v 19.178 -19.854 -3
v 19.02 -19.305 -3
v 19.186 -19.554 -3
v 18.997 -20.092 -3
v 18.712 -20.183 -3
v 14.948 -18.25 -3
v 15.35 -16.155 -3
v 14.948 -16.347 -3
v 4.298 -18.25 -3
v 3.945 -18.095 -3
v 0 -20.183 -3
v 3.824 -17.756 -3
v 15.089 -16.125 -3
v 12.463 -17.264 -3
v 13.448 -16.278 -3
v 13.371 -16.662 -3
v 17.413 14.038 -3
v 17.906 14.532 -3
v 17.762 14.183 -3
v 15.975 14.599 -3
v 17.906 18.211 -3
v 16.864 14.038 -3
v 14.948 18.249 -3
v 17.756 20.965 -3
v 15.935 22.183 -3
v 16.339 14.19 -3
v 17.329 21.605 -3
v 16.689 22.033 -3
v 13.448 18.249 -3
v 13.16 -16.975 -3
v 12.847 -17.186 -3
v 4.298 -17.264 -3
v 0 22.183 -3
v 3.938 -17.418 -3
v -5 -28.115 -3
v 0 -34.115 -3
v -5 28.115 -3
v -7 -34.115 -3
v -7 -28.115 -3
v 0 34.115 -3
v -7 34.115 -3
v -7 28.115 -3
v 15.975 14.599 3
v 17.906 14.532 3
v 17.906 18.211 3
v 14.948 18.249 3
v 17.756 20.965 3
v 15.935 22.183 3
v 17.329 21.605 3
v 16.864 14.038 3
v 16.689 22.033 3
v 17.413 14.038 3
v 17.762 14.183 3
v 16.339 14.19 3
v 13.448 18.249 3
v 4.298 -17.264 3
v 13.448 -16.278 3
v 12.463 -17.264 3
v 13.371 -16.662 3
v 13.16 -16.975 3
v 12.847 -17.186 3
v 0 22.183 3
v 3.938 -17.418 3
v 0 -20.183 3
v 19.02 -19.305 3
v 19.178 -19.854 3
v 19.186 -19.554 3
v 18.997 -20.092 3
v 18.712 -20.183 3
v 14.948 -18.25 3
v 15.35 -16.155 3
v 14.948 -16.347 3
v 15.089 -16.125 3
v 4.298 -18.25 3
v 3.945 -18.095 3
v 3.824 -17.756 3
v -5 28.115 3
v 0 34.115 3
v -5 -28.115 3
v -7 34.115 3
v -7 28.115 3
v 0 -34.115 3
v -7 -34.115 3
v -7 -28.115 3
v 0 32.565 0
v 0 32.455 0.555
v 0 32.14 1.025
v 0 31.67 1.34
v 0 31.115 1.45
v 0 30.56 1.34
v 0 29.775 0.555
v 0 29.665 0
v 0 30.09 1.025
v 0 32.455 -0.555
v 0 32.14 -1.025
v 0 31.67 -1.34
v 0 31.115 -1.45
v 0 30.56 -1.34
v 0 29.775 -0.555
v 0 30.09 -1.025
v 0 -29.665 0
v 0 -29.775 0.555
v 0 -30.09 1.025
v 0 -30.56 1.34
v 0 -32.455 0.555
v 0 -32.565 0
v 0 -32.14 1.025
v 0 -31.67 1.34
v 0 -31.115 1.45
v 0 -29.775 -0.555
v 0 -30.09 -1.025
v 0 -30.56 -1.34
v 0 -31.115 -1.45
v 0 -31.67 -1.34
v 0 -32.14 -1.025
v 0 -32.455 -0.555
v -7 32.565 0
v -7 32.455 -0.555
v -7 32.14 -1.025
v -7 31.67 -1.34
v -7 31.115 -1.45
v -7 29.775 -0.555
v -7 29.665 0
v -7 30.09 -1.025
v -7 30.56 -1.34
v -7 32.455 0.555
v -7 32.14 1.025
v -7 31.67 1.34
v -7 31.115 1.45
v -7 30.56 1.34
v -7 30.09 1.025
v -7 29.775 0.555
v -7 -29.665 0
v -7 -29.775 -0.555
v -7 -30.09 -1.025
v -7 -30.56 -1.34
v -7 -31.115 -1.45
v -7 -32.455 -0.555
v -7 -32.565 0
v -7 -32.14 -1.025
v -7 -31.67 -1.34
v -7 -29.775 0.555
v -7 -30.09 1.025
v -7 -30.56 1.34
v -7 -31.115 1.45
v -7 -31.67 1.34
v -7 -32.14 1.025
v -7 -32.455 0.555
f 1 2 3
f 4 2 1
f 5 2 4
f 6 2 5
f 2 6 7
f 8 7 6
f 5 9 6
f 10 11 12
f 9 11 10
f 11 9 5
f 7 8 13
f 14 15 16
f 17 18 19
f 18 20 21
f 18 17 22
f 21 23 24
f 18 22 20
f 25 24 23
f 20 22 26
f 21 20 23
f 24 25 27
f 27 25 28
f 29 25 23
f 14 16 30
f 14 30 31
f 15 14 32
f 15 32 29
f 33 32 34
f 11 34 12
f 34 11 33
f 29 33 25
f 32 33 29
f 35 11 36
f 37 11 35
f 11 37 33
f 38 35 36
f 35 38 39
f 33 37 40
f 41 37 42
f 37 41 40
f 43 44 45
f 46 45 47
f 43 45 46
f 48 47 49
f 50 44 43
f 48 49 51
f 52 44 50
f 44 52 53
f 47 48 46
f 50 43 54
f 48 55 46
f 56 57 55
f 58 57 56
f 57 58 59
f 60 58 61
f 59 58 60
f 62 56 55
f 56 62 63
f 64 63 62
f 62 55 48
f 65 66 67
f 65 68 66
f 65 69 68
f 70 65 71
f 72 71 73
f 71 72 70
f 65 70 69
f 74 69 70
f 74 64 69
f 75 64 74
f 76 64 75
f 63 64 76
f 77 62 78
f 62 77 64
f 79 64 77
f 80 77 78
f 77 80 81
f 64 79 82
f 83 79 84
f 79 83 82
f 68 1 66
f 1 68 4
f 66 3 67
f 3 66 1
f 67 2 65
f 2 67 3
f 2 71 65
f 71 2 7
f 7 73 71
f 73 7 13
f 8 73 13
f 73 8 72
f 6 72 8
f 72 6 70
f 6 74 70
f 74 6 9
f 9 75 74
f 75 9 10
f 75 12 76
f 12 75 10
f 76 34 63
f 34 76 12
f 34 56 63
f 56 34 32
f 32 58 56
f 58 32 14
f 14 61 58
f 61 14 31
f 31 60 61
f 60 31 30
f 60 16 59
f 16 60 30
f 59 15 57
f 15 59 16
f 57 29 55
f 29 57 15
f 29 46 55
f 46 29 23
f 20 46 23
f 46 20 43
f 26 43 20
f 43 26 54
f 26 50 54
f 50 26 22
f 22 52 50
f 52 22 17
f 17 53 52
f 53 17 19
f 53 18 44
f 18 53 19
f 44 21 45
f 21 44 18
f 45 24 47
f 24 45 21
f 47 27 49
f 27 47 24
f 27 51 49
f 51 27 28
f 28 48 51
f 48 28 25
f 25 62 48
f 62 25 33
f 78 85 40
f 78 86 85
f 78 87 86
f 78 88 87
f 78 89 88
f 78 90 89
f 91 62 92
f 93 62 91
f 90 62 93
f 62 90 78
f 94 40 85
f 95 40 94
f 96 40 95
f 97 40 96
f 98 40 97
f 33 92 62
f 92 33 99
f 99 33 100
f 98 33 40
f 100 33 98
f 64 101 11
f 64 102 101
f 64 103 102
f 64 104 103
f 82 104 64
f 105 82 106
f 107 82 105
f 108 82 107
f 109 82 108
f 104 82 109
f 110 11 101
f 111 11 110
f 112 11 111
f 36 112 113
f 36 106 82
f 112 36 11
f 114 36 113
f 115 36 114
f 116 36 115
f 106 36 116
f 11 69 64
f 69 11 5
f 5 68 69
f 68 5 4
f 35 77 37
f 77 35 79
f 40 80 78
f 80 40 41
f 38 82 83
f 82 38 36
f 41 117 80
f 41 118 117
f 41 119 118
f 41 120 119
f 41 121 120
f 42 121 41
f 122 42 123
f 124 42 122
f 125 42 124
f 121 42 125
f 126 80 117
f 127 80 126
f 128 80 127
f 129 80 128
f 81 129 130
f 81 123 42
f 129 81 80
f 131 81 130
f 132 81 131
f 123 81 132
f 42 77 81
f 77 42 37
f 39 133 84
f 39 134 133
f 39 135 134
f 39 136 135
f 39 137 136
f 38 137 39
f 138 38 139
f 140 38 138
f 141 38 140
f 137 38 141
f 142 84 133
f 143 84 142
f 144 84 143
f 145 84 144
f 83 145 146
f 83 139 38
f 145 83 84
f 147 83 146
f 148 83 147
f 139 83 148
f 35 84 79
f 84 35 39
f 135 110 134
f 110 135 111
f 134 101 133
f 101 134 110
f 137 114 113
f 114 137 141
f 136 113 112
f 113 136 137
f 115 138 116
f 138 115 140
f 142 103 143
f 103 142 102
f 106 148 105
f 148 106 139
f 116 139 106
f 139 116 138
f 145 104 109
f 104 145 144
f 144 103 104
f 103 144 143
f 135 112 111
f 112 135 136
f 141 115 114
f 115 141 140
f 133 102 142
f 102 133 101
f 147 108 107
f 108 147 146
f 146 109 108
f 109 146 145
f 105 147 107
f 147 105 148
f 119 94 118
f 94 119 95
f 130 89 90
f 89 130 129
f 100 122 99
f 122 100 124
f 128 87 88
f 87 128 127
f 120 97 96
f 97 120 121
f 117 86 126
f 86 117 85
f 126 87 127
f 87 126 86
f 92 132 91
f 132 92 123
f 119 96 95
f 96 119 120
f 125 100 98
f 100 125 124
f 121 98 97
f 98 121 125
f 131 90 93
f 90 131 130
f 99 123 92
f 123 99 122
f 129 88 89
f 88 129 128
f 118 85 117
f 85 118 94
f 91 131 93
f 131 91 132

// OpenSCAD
// Remix of http://www.thingiverse.com/thing:806093

//Clip thickness
CLIP_H = 6;
// Holes diameter
HOLE_DIAMETER = 2.9;
// Distance between the 2 holes
PILLAR_PITCH = 62.23;

// Height of the mounting bar
MOUNT_H = 5;
// Height of pillars
PILLAR_H = 2;

PILLAR_1_Y_OFFSET = PILLAR_PITCH/2;
PILLAR_2_Y_OFFSET = -PILLAR_PITCH/2;

module shape()
{
    p = [[9.403850,21.092300],[9.584450,20.854000],[9.593250,20.554200],[9.427250,20.305200],[5.756350,17.154800],[5.495650,17.124500],[5.354950,17.347200],[5.354950,19.249500],[-5.295400,19.249500],[-5.647940,19.095200],[-5.769030,18.756400],[-5.654770,18.417500],[-5.295400,18.264200],[2.869650,18.264200],[3.253450,18.186000],[3.566950,17.975100],[3.777850,17.661600],[3.854950,17.277800],[3.854950,-17.249500],[5.354950,-17.249500],[6.381350,-13.599100],[6.745650,-13.189900],[7.271050,-13.038600],[7.819850,-13.038600],[8.168450,-13.183100],[8.312950,-13.531700],[8.312950,-17.211400],[8.162650,-19.965300],[7.735850,-20.605000],[7.096250,-21.032700],[6.341350,-21.183100],[-9.593250,-21.183100],[-9.593250,21.183100],[9.118650,21.183100]];
    
    xm = min([ for (x=p) x[0] ]);
    ym = min([ for (x=p) x[1] ]); 
    echo([xm, ym]);
    translate([0,22.183,0]) // This offset is know by displaying 
                            // DXF file a CAD software
        rotate([180,0,0])
            translate([-xm, -ym])
                polygon(p);
}

module din_clip() {

	difference() {
		
		union() {
            linear_extrude(height=CLIP_H, center=true, convexity=5) {
                //import(file="PCB_din_clip.dxf", $fn=64);
                shape();
            }
		      
            translate([-MOUNT_H/2, 0, 0]) {
                cube([MOUNT_H,PILLAR_PITCH+6,CLIP_H], center=true);
            }
            
            translate([-PILLAR_H/2-MOUNT_H, PILLAR_1_Y_OFFSET, 0]) {
				rotate([0, 0, 0]) {
					cube([PILLAR_H,6,CLIP_H], center = true);
				}
            }

            translate([-PILLAR_H/2-MOUNT_H, PILLAR_2_Y_OFFSET, 0]) {
				rotate([0, 0, 0]) {
					cube([PILLAR_H,6,CLIP_H], center = true);
				}
            }
		}

		union() {
			translate([-PILLAR_H-MOUNT_H-0.5, PILLAR_2_Y_OFFSET, 0]) {
				rotate([0, 90, 0]) {
					cylinder(h= PILLAR_H+MOUNT_H+1, r = HOLE_DIAMETER / 2, $fn = 16);
				}
			}
			translate([-PILLAR_H-MOUNT_H-0.5, PILLAR_1_Y_OFFSET, 0]) {
				rotate([0, 90, 0]) {
					cylinder(h= PILLAR_H+MOUNT_H+1, r = HOLE_DIAMETER / 2, $fn = 16);
				}
			}
		}
    }
}

din_clip();
